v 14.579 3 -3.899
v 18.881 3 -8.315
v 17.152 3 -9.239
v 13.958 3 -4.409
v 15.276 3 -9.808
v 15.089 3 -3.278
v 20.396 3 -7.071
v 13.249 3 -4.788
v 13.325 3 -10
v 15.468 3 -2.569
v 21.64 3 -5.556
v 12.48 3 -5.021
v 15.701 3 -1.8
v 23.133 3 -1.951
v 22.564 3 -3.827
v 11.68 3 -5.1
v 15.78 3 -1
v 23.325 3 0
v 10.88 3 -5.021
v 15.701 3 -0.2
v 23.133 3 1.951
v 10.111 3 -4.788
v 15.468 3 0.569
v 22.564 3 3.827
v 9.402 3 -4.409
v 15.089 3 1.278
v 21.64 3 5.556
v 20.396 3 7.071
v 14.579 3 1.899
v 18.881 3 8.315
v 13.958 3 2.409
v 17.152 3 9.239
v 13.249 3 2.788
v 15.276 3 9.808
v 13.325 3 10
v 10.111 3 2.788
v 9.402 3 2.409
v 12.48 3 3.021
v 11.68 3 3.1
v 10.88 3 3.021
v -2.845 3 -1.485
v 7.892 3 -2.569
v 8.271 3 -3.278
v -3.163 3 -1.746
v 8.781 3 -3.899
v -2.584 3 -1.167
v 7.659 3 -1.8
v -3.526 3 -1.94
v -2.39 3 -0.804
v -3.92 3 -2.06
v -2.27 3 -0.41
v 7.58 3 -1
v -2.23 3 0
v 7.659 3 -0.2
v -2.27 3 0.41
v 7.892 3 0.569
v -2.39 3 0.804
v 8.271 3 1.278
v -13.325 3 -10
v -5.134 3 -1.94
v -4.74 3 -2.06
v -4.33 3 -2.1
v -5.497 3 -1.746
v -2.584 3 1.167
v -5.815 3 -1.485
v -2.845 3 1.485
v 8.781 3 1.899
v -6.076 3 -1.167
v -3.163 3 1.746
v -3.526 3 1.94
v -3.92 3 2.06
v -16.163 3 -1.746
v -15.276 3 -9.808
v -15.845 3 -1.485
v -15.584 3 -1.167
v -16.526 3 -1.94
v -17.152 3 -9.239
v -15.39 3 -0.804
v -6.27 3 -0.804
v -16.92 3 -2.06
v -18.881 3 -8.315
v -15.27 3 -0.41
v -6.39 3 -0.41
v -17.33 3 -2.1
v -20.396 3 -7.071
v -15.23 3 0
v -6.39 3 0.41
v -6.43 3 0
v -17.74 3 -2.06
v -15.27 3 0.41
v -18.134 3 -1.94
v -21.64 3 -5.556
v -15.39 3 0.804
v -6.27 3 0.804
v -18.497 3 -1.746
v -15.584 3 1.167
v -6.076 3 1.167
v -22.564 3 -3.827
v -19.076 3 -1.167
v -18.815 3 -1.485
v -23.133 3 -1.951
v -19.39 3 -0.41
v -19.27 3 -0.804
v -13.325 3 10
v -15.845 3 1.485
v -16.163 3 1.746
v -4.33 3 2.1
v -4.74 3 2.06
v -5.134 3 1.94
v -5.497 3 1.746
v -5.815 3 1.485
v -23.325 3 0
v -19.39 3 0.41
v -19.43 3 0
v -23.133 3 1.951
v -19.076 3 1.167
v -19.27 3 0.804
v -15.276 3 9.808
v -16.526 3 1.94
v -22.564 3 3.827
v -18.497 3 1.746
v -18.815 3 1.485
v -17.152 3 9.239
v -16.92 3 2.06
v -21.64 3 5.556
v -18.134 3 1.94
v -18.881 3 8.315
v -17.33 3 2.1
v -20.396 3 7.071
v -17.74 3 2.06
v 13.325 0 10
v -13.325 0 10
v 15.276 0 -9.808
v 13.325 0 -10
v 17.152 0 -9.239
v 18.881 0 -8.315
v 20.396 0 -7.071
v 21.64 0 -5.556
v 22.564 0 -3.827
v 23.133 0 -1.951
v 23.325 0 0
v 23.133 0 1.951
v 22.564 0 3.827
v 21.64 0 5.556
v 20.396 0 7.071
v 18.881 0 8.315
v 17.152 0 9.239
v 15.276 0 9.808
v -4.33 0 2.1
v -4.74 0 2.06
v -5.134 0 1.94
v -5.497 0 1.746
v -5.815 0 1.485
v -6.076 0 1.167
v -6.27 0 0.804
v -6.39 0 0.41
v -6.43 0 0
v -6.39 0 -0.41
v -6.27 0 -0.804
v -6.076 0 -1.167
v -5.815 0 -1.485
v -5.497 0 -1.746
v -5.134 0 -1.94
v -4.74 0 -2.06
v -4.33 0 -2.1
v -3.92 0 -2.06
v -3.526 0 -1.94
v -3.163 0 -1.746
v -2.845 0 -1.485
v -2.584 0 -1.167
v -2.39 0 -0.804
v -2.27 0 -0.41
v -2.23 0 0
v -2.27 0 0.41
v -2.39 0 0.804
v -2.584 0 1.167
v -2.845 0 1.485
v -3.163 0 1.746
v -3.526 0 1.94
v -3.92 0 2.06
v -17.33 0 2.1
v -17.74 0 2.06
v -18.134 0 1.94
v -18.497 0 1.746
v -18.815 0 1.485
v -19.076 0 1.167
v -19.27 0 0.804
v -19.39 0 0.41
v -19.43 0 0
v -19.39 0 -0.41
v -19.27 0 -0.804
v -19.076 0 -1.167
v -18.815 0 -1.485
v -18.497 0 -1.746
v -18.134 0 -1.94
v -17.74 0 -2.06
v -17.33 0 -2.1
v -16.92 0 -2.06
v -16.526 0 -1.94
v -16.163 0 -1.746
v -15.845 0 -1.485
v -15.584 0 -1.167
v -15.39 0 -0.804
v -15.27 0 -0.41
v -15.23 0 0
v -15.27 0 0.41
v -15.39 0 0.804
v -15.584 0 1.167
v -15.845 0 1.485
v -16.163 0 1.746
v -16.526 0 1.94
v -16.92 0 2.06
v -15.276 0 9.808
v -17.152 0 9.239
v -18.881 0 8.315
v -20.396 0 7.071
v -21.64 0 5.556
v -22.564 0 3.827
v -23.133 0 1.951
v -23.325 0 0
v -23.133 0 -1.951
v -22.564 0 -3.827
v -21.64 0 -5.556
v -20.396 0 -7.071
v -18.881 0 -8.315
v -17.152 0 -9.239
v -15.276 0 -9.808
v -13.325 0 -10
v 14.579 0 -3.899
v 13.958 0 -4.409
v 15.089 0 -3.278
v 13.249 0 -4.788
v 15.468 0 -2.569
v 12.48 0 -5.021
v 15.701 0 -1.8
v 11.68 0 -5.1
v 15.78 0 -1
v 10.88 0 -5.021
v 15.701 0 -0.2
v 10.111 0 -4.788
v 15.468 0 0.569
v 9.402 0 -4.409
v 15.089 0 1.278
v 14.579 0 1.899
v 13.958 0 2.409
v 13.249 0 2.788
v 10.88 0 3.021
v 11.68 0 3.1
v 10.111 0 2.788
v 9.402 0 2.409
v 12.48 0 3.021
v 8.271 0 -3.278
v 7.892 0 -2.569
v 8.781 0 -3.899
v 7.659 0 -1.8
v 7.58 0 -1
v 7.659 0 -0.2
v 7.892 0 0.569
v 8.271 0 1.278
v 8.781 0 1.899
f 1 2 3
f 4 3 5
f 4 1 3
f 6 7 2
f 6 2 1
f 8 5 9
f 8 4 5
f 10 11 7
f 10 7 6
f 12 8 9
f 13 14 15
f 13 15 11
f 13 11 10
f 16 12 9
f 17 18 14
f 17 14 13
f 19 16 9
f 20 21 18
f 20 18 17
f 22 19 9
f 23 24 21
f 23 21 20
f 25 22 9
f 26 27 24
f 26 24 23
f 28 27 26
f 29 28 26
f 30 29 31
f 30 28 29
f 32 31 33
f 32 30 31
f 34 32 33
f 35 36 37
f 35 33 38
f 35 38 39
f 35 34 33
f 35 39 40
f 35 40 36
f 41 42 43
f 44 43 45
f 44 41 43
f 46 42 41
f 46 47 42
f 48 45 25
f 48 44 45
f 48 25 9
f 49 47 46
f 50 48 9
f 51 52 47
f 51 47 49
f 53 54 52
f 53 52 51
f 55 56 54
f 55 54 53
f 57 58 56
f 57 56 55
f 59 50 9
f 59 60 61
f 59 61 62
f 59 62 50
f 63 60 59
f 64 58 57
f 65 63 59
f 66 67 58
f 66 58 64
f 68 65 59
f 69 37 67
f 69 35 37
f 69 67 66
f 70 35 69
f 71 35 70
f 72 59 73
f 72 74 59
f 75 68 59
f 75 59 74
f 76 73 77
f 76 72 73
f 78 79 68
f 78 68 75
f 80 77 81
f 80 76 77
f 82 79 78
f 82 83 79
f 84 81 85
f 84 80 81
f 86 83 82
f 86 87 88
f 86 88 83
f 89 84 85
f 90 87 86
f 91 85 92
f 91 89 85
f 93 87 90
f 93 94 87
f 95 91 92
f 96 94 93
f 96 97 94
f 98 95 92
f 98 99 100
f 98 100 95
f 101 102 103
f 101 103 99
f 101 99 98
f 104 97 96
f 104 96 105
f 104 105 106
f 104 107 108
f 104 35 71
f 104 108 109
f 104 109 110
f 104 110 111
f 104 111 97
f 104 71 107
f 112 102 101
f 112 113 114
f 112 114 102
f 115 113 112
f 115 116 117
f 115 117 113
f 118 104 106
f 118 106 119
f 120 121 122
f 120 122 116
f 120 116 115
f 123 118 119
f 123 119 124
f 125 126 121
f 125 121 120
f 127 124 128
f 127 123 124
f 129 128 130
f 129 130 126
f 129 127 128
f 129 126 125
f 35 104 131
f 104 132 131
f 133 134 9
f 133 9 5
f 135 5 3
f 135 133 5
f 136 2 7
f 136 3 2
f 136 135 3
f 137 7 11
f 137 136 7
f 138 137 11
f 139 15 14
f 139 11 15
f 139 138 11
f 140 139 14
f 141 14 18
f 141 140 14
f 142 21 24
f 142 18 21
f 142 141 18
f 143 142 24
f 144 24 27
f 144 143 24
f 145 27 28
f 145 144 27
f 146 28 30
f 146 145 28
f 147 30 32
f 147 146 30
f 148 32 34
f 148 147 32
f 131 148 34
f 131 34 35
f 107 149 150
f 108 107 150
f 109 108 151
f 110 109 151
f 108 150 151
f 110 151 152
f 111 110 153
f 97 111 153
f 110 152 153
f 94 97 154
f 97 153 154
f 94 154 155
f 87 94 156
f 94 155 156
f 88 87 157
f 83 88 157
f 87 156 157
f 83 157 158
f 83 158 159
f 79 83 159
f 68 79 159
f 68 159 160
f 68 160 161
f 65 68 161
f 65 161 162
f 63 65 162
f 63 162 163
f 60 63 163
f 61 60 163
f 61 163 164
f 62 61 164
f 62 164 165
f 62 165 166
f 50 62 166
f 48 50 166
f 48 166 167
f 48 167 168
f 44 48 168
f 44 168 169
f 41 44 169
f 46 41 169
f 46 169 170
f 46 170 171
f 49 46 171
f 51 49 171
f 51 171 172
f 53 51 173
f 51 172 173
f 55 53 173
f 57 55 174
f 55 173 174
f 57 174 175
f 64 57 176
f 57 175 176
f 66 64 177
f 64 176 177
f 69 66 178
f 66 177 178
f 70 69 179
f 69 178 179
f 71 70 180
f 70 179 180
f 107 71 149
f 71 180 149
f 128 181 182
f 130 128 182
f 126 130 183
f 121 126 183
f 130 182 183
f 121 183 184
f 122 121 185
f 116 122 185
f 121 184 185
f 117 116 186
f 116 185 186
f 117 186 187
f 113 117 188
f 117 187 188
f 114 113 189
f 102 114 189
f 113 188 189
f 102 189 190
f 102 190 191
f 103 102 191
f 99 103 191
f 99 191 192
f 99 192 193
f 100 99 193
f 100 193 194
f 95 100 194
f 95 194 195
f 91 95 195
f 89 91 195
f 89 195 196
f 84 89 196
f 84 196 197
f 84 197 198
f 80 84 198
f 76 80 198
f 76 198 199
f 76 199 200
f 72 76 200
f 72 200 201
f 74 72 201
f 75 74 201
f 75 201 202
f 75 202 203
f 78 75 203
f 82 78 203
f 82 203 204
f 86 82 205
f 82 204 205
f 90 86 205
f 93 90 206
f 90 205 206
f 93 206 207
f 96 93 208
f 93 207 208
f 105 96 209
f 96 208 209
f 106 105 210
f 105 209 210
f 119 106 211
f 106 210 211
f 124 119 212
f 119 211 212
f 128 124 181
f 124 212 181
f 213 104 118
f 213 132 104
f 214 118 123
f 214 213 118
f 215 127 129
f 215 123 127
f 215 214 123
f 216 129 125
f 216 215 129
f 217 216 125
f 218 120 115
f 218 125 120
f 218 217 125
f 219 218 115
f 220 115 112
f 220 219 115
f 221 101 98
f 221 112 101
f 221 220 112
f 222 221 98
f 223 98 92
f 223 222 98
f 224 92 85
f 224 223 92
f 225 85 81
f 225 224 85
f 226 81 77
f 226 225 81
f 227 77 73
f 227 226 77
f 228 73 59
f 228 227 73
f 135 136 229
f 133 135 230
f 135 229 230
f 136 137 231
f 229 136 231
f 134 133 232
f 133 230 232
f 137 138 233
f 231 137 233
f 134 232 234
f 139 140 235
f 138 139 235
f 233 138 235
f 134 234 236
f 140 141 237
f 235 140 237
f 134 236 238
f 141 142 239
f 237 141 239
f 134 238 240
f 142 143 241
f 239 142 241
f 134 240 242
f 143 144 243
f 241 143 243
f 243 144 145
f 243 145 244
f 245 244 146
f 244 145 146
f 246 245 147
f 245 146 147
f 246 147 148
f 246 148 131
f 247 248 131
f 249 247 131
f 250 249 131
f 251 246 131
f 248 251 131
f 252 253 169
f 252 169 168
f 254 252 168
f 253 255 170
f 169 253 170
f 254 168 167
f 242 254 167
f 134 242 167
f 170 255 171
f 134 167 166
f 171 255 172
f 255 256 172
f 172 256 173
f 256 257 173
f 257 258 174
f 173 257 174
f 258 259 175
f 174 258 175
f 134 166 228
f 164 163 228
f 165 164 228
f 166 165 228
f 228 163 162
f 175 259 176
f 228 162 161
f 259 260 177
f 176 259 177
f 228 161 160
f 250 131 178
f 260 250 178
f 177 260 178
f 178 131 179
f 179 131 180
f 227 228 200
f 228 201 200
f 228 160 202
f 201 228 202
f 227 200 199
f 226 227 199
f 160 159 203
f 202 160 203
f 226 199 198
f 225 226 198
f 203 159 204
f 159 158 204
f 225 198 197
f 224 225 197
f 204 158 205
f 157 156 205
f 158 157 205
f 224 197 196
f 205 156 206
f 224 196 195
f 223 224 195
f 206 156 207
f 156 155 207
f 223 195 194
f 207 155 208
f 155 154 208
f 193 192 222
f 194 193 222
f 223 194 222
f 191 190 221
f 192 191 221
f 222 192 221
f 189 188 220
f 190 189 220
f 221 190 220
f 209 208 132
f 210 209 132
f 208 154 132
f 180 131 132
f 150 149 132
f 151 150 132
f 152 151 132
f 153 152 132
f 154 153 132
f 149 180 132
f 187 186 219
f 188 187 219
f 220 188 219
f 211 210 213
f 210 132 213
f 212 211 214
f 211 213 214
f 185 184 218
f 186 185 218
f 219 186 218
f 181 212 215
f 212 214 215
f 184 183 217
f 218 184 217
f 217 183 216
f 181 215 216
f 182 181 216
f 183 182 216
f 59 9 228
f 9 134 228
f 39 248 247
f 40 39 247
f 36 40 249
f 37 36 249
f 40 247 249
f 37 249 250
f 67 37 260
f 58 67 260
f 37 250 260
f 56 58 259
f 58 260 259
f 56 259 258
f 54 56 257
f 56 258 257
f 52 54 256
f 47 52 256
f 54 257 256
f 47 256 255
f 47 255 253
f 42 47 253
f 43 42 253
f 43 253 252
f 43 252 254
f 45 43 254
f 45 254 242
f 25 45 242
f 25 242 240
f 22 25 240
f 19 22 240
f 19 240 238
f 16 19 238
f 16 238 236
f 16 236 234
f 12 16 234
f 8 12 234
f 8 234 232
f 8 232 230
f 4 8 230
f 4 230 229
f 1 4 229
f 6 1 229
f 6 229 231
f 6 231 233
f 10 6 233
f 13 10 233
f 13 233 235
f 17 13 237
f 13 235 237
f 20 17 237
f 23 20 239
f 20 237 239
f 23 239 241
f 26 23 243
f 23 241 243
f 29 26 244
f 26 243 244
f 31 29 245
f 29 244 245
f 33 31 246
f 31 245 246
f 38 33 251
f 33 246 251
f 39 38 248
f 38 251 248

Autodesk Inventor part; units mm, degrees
ref_plane "YZ Plane" through (0, 0, 0) normal (1, 0, 0) x (0, 1, 0)
ref_plane "XZ Plane" through (0, 0, 0) normal (0, 1, 0) x (-1, 0, 0)
ref_plane "XY Plane" through (0, 0, 0) normal (0, 0, 1) x (1, 0, 0)
sketch "Sketch1" plane through (0, 0, 0) normal (0, 1, 0) x (-1, 0, 0)
  line L0 (13.325, 0) -> (-13.325, 0) construction
  line L1 (13.325, 10) -> (-13.325, 10)
  line L2 (-13.325, -10) -> (13.325, -10)
  arc A0 (13.325, -10) -> (13.325, 10) centre (13.325, 0) ccw
  arc A1 (-13.325, 10) -> (-13.325, -10) centre (-13.325, 0) ccw
  point P0 (0, 0)
  dimension "d0" = 26.65
  dimension "d1" = 20
extrude "Extrusion1" add sketch "Sketch1" along normal blind 3
sketch "Sketch2" plane through (0, 3, 0) normal (0, 1, 0) x (1, 0, 0)
  point P0 (0, 0)
  point P1 (-17.33, 0)
  point P2 (-4.33, 0)
  dimension "d4" = 17.33
  dimension "d5" = 4.33
hole "Hole1" at (-17.33, 3, 0) at (-4.33, 3, 0) direction (0, -1, 0) diameter 4.2 end through all
sketch "Sketch3" plane through (0, 3, 0) normal (0, 1, 0) x (1, 0, 0)
  line L0 (-32.655, 0) -> (32.655, 0) projected
  point P0 (0, 0)
  point P1 (11.68, 1)
  dimension "d13" = 1
  dimension "d14" = 11.68
hole "Hole2" at (11.68, 3, -1) direction (0, -1, 0) diameter 8.2 end through all
properties part number "X Adjustment Block" material "Aluminum 6061"
